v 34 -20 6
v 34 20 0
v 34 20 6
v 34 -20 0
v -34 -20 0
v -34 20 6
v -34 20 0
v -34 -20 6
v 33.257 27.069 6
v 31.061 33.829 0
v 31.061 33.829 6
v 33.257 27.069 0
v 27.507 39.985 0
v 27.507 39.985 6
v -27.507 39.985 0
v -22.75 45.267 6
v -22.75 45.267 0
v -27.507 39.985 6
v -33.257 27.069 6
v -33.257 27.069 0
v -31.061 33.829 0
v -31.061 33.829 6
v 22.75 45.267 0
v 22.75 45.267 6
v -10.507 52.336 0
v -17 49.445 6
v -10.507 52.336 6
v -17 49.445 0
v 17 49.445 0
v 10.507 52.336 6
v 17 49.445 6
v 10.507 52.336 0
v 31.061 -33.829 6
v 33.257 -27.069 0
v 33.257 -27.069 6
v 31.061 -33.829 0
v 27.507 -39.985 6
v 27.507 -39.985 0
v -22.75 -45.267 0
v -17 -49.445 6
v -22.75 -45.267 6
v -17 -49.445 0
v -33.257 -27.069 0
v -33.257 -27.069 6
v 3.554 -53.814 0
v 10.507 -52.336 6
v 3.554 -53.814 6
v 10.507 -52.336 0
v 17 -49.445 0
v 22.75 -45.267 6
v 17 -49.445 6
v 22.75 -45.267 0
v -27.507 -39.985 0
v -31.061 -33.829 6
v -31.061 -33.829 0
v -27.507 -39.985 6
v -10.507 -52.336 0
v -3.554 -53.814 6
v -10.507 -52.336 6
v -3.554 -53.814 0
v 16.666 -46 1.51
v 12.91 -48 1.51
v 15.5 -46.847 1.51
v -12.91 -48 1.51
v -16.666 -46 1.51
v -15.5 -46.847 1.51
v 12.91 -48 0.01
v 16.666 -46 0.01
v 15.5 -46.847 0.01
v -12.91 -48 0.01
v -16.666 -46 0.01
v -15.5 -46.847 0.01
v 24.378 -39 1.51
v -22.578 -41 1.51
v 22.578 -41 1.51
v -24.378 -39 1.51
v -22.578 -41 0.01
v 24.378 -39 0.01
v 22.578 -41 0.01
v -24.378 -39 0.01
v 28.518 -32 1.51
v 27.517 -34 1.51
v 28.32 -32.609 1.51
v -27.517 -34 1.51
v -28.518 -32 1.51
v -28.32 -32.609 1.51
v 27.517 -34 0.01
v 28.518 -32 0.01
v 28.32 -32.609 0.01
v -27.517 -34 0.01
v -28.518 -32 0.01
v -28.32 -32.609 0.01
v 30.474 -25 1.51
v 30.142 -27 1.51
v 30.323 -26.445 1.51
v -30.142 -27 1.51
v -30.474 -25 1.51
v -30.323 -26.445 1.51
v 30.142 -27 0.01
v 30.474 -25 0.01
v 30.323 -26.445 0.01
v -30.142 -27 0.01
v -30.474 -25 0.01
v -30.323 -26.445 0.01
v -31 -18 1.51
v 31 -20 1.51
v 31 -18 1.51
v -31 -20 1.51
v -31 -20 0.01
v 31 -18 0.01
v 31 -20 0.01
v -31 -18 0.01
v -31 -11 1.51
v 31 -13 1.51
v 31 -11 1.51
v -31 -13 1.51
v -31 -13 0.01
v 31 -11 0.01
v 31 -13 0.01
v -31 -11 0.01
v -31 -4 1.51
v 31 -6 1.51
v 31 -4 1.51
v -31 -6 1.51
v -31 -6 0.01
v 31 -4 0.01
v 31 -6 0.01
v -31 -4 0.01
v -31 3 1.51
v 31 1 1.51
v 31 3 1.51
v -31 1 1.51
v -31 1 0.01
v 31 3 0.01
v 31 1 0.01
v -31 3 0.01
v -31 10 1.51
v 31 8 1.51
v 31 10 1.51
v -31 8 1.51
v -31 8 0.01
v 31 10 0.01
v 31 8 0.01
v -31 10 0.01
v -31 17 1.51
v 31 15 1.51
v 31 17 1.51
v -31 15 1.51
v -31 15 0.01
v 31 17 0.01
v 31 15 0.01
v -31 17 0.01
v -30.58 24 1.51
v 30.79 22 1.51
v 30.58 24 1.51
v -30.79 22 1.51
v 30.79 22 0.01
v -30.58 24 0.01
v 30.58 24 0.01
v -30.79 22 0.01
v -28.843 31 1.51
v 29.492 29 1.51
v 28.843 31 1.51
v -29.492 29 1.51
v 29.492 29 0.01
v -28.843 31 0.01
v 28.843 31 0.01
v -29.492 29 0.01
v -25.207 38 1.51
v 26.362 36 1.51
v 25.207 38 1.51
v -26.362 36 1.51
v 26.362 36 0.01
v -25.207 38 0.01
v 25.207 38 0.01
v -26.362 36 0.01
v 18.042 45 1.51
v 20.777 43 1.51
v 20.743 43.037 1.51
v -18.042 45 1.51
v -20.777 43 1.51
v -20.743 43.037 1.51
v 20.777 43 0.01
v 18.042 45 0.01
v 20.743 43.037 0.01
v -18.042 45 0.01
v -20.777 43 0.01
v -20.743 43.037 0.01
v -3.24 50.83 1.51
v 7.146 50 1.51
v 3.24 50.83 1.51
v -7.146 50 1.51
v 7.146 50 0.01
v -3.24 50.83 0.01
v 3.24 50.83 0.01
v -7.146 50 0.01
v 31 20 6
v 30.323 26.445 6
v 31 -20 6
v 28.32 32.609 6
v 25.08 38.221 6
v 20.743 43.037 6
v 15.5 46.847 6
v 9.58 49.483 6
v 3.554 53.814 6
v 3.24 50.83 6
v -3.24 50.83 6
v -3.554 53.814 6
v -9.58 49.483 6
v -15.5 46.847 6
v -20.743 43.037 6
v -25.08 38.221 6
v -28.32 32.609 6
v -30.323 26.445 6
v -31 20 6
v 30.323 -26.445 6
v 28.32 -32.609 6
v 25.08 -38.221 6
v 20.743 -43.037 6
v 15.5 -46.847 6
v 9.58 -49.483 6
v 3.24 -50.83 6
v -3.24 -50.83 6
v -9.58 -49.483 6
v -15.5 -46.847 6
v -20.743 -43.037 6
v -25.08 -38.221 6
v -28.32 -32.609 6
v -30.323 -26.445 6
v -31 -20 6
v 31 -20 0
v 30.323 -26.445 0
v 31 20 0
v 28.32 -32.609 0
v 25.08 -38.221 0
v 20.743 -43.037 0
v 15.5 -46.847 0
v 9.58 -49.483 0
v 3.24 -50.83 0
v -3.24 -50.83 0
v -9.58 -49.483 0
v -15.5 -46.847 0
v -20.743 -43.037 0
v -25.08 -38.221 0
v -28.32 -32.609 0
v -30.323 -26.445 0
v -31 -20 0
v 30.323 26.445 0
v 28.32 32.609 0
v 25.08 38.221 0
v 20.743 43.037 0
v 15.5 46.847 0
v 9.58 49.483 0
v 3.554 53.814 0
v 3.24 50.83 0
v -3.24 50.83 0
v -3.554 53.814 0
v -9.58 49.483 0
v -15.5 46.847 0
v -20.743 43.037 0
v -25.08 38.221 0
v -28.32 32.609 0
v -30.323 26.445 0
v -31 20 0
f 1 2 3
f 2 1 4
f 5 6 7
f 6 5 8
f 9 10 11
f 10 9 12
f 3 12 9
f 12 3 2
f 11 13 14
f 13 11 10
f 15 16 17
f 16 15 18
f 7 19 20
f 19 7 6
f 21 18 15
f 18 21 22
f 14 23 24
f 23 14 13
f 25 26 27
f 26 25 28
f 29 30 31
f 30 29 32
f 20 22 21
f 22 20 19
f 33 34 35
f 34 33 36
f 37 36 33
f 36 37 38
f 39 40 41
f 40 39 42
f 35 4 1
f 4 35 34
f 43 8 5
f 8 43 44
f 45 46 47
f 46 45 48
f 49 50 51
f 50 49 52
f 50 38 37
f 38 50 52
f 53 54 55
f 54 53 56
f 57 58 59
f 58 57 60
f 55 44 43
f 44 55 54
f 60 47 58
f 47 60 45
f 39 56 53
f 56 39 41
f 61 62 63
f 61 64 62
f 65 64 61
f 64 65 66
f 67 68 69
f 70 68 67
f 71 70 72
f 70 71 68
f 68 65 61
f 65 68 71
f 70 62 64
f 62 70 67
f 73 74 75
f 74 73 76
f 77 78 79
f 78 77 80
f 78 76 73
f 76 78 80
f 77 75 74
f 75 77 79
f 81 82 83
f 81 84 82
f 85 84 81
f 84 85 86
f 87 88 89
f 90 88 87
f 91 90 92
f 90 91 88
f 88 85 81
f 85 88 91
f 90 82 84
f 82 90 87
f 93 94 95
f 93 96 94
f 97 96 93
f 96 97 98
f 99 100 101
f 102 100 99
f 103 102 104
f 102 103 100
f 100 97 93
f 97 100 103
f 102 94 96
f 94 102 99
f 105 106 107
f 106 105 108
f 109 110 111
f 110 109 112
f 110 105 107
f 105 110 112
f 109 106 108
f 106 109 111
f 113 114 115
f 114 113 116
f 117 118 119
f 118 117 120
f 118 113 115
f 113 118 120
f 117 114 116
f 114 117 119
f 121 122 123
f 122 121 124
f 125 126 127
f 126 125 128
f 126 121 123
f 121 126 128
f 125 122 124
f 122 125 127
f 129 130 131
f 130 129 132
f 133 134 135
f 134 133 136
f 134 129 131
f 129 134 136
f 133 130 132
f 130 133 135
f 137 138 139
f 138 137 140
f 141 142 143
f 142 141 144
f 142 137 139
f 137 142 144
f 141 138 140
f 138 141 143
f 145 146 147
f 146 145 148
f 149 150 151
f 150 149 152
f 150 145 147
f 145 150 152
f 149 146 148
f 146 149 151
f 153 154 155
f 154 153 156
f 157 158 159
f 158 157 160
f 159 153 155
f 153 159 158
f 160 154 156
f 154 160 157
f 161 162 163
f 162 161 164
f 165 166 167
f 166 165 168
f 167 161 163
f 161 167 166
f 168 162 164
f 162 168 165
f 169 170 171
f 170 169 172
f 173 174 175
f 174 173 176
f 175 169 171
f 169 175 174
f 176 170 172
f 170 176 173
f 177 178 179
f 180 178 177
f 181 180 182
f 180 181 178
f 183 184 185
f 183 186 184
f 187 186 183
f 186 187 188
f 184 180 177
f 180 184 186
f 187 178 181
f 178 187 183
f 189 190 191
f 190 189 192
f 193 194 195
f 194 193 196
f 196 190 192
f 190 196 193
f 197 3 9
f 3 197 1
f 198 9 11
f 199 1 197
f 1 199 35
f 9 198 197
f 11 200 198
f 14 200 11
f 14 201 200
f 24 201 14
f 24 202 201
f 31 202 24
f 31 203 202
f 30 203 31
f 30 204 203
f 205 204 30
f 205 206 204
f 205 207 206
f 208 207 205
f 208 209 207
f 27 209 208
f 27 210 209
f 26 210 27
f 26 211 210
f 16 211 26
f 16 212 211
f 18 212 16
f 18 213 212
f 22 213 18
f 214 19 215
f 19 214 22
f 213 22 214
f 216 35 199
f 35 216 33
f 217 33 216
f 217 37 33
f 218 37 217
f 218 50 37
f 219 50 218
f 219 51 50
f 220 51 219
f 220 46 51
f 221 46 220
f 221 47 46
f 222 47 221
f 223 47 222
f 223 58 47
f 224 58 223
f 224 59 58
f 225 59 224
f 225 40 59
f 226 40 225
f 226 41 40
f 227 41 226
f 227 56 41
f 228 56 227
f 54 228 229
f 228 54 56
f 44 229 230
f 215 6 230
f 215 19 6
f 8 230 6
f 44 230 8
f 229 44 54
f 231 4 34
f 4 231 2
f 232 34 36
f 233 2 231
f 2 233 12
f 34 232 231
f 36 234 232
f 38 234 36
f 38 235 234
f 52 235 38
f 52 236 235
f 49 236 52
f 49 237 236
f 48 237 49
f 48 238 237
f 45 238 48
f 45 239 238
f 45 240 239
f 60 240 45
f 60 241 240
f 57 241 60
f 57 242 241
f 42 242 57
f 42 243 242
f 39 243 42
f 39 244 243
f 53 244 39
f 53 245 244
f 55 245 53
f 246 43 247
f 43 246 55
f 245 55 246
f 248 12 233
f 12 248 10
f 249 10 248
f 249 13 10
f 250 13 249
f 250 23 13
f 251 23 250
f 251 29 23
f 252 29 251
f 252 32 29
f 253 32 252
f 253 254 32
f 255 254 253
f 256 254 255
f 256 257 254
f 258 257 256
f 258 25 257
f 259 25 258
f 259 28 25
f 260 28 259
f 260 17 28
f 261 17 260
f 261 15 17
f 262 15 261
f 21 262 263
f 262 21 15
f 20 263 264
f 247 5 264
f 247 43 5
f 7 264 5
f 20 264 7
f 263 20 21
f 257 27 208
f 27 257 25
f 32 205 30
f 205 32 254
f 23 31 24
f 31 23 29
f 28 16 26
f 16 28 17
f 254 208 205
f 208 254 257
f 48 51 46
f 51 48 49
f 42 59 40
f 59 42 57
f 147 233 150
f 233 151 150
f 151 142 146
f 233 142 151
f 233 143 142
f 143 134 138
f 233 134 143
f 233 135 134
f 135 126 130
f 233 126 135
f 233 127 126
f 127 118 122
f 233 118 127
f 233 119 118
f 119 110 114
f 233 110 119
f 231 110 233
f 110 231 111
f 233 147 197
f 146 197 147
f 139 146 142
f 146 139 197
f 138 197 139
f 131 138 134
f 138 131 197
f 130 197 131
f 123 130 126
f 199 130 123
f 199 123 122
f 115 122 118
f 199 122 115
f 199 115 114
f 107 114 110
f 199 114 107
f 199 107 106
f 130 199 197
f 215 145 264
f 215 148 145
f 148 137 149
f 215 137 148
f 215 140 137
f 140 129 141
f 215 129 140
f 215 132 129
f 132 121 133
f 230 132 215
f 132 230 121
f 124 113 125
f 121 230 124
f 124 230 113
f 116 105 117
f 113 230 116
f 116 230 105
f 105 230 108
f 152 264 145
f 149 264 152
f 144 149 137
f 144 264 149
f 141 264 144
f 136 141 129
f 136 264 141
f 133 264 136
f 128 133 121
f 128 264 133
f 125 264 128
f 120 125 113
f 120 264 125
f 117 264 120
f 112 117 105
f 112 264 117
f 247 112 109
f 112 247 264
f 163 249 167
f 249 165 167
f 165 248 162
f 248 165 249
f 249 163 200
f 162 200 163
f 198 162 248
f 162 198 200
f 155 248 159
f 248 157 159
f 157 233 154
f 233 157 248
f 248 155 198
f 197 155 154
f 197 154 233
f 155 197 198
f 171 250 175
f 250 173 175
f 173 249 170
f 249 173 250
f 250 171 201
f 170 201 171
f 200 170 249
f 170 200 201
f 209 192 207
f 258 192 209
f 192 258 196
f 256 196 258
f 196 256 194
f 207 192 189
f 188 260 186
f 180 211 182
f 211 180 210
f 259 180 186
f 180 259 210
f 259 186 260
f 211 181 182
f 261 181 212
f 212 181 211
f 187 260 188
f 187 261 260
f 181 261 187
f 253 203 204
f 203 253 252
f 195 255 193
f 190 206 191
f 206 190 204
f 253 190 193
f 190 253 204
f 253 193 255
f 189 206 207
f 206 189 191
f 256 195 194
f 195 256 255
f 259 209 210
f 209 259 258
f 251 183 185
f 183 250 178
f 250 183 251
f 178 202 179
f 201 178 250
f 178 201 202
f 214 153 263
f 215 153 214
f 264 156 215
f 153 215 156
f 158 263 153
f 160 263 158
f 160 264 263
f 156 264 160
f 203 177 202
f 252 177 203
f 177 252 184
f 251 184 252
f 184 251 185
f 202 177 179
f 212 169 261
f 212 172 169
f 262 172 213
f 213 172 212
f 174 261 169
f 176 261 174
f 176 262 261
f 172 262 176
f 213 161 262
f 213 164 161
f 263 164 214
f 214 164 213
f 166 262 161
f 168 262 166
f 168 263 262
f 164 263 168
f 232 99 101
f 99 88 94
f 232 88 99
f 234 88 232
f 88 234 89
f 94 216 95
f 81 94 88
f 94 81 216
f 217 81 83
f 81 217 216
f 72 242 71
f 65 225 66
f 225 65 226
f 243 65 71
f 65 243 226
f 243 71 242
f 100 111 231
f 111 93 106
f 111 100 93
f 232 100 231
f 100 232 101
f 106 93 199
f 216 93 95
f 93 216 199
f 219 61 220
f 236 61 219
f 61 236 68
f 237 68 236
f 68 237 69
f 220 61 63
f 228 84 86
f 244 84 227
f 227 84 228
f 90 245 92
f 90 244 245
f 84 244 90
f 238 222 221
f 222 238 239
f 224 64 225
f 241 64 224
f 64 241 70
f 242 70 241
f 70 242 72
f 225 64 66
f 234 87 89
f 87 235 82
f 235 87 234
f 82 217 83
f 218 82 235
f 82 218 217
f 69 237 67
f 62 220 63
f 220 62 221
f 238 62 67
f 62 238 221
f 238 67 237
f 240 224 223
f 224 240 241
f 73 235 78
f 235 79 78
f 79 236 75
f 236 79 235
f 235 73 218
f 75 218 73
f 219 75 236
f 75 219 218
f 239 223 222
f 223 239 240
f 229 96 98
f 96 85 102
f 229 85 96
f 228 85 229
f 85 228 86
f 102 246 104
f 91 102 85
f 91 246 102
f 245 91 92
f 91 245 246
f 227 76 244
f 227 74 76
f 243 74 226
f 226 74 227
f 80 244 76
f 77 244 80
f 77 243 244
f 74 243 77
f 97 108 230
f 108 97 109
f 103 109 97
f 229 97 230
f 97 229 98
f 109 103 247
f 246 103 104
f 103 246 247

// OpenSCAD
// preview[view:south east, tilt:top diagonal]

/* [Lozenge] */

Width = 68; // [25:200]
Length = 108;// [50:200]
Height = 6;//[4:10]
//*********Declaration of customization variables************
/* [Hidden] */

	//Parameters
	//diameter of the circle, or side of the square
meshscreen_d=Width;
//length of lozenge or rectangle dish
meshscreen_l=Length-Width;
	//width of the solid border around the mesh.
meshscreen_borderwidth=3;
	//thickness of the screen. should be a multiple of your layer height for best results.
meshscreen_h=Height/2; 
	//print layer height
layer_h=0.3;
	//meshthread width. Please keep this a multiple of the width of the thread of 
	//your printer. Use multiple shells in your slicing settings if necessary.
meshthread_w=2;
	//spacing in between mesh threads
mesh_space=5;
default_height=10;
default_border_w=1;
default_width=60;
default_length=160;

meshscreen_lozenge(
h=meshscreen_h,
border_w=meshscreen_borderwidth,
mesh_w=meshthread_w,
mesh_space=mesh_space,
width=meshscreen_d,
length=meshscreen_l,
layer_h=layer_h);
/**********************************/

module meshscreen_lozenge(h=2,border_w=meshscreen_borderwidth,mesh_w=1,mesh_space=2,width=60,length=60,layer_h=0.3){
union(){
	intersection(){
		translate([0,0,h/2])lozenge(height=h,width=width,length=length);
		mesh_raw(h=h,mesh_w=mesh_w,mesh_space=mesh_space,width=2*max(width,length),layer_height=0.3);
	}
translate([0,0,h]) 
difference(){
//union(){
lozenge(height=h*2,width=width,length=length);
lozenge(height=h*4,width=width-2*border_w,length=length);
}
}
}

module lozenge(height=default_height,width=default_width,length=default_length){
union(){
cube([width,length,height],center=true);
translate([0,length/2,-height/2])cylinder(r=width/2,height);
translate([0,-length/2,-height/2])cylinder(r=width/2,height);
}
}

/**********************************/

module meshscreen_square(h=2,border_w=meshscreen_borderwidth,mesh_w=1,mesh_space=2,width=60,layer_h=0.3){
	intersection(){
		translate([0,0,h/2])cube([width,width,h],center=true);
		mesh_raw(h=h,mesh_w=mesh_w,mesh_space=mesh_space,width=width,layer_height=0.3);
	}
	difference(){
		translate([0,0,h/2])cube([width,width,h],center=true);	translate([0,0,h/2])cube([width-border_w*2,width-border_w*2,h*1.1],center=true);
	}
}

/**********************************/

module meshscreen_circle(h=2,border_w=meshscreen_borderwidth,mesh_w=1,mesh_space=2,width=60,layer_h=0.3){
	intersection(){
		cylinder(r=width/2,h);
		mesh_raw(h=h,mesh_w=mesh_w,mesh_space=mesh_space,width=width,layer_height=0.3);
	}
	difference(){
		cylinder(r=width/2,h);
		translate([0,0,-h*0.05])cylinder(r=width/2-border_w,h=h*1.1);
	}
}
module mesh_raw(h=2,mesh_w=1,mesh_space=2,width=50,layer_h=0.3){
	for ( j = [0 :(mesh_w+mesh_space): width] )
	{
	   //	translate([0,0,0.01])translate([-width/2+j, 0, h/4])cube([mesh_w,width,h/2-layer_h/10],center=true);
		translate([0,0,0.01])translate([0, -width/2+j, h/4])cube([width,mesh_w,h/2],center=true);
	}

}
